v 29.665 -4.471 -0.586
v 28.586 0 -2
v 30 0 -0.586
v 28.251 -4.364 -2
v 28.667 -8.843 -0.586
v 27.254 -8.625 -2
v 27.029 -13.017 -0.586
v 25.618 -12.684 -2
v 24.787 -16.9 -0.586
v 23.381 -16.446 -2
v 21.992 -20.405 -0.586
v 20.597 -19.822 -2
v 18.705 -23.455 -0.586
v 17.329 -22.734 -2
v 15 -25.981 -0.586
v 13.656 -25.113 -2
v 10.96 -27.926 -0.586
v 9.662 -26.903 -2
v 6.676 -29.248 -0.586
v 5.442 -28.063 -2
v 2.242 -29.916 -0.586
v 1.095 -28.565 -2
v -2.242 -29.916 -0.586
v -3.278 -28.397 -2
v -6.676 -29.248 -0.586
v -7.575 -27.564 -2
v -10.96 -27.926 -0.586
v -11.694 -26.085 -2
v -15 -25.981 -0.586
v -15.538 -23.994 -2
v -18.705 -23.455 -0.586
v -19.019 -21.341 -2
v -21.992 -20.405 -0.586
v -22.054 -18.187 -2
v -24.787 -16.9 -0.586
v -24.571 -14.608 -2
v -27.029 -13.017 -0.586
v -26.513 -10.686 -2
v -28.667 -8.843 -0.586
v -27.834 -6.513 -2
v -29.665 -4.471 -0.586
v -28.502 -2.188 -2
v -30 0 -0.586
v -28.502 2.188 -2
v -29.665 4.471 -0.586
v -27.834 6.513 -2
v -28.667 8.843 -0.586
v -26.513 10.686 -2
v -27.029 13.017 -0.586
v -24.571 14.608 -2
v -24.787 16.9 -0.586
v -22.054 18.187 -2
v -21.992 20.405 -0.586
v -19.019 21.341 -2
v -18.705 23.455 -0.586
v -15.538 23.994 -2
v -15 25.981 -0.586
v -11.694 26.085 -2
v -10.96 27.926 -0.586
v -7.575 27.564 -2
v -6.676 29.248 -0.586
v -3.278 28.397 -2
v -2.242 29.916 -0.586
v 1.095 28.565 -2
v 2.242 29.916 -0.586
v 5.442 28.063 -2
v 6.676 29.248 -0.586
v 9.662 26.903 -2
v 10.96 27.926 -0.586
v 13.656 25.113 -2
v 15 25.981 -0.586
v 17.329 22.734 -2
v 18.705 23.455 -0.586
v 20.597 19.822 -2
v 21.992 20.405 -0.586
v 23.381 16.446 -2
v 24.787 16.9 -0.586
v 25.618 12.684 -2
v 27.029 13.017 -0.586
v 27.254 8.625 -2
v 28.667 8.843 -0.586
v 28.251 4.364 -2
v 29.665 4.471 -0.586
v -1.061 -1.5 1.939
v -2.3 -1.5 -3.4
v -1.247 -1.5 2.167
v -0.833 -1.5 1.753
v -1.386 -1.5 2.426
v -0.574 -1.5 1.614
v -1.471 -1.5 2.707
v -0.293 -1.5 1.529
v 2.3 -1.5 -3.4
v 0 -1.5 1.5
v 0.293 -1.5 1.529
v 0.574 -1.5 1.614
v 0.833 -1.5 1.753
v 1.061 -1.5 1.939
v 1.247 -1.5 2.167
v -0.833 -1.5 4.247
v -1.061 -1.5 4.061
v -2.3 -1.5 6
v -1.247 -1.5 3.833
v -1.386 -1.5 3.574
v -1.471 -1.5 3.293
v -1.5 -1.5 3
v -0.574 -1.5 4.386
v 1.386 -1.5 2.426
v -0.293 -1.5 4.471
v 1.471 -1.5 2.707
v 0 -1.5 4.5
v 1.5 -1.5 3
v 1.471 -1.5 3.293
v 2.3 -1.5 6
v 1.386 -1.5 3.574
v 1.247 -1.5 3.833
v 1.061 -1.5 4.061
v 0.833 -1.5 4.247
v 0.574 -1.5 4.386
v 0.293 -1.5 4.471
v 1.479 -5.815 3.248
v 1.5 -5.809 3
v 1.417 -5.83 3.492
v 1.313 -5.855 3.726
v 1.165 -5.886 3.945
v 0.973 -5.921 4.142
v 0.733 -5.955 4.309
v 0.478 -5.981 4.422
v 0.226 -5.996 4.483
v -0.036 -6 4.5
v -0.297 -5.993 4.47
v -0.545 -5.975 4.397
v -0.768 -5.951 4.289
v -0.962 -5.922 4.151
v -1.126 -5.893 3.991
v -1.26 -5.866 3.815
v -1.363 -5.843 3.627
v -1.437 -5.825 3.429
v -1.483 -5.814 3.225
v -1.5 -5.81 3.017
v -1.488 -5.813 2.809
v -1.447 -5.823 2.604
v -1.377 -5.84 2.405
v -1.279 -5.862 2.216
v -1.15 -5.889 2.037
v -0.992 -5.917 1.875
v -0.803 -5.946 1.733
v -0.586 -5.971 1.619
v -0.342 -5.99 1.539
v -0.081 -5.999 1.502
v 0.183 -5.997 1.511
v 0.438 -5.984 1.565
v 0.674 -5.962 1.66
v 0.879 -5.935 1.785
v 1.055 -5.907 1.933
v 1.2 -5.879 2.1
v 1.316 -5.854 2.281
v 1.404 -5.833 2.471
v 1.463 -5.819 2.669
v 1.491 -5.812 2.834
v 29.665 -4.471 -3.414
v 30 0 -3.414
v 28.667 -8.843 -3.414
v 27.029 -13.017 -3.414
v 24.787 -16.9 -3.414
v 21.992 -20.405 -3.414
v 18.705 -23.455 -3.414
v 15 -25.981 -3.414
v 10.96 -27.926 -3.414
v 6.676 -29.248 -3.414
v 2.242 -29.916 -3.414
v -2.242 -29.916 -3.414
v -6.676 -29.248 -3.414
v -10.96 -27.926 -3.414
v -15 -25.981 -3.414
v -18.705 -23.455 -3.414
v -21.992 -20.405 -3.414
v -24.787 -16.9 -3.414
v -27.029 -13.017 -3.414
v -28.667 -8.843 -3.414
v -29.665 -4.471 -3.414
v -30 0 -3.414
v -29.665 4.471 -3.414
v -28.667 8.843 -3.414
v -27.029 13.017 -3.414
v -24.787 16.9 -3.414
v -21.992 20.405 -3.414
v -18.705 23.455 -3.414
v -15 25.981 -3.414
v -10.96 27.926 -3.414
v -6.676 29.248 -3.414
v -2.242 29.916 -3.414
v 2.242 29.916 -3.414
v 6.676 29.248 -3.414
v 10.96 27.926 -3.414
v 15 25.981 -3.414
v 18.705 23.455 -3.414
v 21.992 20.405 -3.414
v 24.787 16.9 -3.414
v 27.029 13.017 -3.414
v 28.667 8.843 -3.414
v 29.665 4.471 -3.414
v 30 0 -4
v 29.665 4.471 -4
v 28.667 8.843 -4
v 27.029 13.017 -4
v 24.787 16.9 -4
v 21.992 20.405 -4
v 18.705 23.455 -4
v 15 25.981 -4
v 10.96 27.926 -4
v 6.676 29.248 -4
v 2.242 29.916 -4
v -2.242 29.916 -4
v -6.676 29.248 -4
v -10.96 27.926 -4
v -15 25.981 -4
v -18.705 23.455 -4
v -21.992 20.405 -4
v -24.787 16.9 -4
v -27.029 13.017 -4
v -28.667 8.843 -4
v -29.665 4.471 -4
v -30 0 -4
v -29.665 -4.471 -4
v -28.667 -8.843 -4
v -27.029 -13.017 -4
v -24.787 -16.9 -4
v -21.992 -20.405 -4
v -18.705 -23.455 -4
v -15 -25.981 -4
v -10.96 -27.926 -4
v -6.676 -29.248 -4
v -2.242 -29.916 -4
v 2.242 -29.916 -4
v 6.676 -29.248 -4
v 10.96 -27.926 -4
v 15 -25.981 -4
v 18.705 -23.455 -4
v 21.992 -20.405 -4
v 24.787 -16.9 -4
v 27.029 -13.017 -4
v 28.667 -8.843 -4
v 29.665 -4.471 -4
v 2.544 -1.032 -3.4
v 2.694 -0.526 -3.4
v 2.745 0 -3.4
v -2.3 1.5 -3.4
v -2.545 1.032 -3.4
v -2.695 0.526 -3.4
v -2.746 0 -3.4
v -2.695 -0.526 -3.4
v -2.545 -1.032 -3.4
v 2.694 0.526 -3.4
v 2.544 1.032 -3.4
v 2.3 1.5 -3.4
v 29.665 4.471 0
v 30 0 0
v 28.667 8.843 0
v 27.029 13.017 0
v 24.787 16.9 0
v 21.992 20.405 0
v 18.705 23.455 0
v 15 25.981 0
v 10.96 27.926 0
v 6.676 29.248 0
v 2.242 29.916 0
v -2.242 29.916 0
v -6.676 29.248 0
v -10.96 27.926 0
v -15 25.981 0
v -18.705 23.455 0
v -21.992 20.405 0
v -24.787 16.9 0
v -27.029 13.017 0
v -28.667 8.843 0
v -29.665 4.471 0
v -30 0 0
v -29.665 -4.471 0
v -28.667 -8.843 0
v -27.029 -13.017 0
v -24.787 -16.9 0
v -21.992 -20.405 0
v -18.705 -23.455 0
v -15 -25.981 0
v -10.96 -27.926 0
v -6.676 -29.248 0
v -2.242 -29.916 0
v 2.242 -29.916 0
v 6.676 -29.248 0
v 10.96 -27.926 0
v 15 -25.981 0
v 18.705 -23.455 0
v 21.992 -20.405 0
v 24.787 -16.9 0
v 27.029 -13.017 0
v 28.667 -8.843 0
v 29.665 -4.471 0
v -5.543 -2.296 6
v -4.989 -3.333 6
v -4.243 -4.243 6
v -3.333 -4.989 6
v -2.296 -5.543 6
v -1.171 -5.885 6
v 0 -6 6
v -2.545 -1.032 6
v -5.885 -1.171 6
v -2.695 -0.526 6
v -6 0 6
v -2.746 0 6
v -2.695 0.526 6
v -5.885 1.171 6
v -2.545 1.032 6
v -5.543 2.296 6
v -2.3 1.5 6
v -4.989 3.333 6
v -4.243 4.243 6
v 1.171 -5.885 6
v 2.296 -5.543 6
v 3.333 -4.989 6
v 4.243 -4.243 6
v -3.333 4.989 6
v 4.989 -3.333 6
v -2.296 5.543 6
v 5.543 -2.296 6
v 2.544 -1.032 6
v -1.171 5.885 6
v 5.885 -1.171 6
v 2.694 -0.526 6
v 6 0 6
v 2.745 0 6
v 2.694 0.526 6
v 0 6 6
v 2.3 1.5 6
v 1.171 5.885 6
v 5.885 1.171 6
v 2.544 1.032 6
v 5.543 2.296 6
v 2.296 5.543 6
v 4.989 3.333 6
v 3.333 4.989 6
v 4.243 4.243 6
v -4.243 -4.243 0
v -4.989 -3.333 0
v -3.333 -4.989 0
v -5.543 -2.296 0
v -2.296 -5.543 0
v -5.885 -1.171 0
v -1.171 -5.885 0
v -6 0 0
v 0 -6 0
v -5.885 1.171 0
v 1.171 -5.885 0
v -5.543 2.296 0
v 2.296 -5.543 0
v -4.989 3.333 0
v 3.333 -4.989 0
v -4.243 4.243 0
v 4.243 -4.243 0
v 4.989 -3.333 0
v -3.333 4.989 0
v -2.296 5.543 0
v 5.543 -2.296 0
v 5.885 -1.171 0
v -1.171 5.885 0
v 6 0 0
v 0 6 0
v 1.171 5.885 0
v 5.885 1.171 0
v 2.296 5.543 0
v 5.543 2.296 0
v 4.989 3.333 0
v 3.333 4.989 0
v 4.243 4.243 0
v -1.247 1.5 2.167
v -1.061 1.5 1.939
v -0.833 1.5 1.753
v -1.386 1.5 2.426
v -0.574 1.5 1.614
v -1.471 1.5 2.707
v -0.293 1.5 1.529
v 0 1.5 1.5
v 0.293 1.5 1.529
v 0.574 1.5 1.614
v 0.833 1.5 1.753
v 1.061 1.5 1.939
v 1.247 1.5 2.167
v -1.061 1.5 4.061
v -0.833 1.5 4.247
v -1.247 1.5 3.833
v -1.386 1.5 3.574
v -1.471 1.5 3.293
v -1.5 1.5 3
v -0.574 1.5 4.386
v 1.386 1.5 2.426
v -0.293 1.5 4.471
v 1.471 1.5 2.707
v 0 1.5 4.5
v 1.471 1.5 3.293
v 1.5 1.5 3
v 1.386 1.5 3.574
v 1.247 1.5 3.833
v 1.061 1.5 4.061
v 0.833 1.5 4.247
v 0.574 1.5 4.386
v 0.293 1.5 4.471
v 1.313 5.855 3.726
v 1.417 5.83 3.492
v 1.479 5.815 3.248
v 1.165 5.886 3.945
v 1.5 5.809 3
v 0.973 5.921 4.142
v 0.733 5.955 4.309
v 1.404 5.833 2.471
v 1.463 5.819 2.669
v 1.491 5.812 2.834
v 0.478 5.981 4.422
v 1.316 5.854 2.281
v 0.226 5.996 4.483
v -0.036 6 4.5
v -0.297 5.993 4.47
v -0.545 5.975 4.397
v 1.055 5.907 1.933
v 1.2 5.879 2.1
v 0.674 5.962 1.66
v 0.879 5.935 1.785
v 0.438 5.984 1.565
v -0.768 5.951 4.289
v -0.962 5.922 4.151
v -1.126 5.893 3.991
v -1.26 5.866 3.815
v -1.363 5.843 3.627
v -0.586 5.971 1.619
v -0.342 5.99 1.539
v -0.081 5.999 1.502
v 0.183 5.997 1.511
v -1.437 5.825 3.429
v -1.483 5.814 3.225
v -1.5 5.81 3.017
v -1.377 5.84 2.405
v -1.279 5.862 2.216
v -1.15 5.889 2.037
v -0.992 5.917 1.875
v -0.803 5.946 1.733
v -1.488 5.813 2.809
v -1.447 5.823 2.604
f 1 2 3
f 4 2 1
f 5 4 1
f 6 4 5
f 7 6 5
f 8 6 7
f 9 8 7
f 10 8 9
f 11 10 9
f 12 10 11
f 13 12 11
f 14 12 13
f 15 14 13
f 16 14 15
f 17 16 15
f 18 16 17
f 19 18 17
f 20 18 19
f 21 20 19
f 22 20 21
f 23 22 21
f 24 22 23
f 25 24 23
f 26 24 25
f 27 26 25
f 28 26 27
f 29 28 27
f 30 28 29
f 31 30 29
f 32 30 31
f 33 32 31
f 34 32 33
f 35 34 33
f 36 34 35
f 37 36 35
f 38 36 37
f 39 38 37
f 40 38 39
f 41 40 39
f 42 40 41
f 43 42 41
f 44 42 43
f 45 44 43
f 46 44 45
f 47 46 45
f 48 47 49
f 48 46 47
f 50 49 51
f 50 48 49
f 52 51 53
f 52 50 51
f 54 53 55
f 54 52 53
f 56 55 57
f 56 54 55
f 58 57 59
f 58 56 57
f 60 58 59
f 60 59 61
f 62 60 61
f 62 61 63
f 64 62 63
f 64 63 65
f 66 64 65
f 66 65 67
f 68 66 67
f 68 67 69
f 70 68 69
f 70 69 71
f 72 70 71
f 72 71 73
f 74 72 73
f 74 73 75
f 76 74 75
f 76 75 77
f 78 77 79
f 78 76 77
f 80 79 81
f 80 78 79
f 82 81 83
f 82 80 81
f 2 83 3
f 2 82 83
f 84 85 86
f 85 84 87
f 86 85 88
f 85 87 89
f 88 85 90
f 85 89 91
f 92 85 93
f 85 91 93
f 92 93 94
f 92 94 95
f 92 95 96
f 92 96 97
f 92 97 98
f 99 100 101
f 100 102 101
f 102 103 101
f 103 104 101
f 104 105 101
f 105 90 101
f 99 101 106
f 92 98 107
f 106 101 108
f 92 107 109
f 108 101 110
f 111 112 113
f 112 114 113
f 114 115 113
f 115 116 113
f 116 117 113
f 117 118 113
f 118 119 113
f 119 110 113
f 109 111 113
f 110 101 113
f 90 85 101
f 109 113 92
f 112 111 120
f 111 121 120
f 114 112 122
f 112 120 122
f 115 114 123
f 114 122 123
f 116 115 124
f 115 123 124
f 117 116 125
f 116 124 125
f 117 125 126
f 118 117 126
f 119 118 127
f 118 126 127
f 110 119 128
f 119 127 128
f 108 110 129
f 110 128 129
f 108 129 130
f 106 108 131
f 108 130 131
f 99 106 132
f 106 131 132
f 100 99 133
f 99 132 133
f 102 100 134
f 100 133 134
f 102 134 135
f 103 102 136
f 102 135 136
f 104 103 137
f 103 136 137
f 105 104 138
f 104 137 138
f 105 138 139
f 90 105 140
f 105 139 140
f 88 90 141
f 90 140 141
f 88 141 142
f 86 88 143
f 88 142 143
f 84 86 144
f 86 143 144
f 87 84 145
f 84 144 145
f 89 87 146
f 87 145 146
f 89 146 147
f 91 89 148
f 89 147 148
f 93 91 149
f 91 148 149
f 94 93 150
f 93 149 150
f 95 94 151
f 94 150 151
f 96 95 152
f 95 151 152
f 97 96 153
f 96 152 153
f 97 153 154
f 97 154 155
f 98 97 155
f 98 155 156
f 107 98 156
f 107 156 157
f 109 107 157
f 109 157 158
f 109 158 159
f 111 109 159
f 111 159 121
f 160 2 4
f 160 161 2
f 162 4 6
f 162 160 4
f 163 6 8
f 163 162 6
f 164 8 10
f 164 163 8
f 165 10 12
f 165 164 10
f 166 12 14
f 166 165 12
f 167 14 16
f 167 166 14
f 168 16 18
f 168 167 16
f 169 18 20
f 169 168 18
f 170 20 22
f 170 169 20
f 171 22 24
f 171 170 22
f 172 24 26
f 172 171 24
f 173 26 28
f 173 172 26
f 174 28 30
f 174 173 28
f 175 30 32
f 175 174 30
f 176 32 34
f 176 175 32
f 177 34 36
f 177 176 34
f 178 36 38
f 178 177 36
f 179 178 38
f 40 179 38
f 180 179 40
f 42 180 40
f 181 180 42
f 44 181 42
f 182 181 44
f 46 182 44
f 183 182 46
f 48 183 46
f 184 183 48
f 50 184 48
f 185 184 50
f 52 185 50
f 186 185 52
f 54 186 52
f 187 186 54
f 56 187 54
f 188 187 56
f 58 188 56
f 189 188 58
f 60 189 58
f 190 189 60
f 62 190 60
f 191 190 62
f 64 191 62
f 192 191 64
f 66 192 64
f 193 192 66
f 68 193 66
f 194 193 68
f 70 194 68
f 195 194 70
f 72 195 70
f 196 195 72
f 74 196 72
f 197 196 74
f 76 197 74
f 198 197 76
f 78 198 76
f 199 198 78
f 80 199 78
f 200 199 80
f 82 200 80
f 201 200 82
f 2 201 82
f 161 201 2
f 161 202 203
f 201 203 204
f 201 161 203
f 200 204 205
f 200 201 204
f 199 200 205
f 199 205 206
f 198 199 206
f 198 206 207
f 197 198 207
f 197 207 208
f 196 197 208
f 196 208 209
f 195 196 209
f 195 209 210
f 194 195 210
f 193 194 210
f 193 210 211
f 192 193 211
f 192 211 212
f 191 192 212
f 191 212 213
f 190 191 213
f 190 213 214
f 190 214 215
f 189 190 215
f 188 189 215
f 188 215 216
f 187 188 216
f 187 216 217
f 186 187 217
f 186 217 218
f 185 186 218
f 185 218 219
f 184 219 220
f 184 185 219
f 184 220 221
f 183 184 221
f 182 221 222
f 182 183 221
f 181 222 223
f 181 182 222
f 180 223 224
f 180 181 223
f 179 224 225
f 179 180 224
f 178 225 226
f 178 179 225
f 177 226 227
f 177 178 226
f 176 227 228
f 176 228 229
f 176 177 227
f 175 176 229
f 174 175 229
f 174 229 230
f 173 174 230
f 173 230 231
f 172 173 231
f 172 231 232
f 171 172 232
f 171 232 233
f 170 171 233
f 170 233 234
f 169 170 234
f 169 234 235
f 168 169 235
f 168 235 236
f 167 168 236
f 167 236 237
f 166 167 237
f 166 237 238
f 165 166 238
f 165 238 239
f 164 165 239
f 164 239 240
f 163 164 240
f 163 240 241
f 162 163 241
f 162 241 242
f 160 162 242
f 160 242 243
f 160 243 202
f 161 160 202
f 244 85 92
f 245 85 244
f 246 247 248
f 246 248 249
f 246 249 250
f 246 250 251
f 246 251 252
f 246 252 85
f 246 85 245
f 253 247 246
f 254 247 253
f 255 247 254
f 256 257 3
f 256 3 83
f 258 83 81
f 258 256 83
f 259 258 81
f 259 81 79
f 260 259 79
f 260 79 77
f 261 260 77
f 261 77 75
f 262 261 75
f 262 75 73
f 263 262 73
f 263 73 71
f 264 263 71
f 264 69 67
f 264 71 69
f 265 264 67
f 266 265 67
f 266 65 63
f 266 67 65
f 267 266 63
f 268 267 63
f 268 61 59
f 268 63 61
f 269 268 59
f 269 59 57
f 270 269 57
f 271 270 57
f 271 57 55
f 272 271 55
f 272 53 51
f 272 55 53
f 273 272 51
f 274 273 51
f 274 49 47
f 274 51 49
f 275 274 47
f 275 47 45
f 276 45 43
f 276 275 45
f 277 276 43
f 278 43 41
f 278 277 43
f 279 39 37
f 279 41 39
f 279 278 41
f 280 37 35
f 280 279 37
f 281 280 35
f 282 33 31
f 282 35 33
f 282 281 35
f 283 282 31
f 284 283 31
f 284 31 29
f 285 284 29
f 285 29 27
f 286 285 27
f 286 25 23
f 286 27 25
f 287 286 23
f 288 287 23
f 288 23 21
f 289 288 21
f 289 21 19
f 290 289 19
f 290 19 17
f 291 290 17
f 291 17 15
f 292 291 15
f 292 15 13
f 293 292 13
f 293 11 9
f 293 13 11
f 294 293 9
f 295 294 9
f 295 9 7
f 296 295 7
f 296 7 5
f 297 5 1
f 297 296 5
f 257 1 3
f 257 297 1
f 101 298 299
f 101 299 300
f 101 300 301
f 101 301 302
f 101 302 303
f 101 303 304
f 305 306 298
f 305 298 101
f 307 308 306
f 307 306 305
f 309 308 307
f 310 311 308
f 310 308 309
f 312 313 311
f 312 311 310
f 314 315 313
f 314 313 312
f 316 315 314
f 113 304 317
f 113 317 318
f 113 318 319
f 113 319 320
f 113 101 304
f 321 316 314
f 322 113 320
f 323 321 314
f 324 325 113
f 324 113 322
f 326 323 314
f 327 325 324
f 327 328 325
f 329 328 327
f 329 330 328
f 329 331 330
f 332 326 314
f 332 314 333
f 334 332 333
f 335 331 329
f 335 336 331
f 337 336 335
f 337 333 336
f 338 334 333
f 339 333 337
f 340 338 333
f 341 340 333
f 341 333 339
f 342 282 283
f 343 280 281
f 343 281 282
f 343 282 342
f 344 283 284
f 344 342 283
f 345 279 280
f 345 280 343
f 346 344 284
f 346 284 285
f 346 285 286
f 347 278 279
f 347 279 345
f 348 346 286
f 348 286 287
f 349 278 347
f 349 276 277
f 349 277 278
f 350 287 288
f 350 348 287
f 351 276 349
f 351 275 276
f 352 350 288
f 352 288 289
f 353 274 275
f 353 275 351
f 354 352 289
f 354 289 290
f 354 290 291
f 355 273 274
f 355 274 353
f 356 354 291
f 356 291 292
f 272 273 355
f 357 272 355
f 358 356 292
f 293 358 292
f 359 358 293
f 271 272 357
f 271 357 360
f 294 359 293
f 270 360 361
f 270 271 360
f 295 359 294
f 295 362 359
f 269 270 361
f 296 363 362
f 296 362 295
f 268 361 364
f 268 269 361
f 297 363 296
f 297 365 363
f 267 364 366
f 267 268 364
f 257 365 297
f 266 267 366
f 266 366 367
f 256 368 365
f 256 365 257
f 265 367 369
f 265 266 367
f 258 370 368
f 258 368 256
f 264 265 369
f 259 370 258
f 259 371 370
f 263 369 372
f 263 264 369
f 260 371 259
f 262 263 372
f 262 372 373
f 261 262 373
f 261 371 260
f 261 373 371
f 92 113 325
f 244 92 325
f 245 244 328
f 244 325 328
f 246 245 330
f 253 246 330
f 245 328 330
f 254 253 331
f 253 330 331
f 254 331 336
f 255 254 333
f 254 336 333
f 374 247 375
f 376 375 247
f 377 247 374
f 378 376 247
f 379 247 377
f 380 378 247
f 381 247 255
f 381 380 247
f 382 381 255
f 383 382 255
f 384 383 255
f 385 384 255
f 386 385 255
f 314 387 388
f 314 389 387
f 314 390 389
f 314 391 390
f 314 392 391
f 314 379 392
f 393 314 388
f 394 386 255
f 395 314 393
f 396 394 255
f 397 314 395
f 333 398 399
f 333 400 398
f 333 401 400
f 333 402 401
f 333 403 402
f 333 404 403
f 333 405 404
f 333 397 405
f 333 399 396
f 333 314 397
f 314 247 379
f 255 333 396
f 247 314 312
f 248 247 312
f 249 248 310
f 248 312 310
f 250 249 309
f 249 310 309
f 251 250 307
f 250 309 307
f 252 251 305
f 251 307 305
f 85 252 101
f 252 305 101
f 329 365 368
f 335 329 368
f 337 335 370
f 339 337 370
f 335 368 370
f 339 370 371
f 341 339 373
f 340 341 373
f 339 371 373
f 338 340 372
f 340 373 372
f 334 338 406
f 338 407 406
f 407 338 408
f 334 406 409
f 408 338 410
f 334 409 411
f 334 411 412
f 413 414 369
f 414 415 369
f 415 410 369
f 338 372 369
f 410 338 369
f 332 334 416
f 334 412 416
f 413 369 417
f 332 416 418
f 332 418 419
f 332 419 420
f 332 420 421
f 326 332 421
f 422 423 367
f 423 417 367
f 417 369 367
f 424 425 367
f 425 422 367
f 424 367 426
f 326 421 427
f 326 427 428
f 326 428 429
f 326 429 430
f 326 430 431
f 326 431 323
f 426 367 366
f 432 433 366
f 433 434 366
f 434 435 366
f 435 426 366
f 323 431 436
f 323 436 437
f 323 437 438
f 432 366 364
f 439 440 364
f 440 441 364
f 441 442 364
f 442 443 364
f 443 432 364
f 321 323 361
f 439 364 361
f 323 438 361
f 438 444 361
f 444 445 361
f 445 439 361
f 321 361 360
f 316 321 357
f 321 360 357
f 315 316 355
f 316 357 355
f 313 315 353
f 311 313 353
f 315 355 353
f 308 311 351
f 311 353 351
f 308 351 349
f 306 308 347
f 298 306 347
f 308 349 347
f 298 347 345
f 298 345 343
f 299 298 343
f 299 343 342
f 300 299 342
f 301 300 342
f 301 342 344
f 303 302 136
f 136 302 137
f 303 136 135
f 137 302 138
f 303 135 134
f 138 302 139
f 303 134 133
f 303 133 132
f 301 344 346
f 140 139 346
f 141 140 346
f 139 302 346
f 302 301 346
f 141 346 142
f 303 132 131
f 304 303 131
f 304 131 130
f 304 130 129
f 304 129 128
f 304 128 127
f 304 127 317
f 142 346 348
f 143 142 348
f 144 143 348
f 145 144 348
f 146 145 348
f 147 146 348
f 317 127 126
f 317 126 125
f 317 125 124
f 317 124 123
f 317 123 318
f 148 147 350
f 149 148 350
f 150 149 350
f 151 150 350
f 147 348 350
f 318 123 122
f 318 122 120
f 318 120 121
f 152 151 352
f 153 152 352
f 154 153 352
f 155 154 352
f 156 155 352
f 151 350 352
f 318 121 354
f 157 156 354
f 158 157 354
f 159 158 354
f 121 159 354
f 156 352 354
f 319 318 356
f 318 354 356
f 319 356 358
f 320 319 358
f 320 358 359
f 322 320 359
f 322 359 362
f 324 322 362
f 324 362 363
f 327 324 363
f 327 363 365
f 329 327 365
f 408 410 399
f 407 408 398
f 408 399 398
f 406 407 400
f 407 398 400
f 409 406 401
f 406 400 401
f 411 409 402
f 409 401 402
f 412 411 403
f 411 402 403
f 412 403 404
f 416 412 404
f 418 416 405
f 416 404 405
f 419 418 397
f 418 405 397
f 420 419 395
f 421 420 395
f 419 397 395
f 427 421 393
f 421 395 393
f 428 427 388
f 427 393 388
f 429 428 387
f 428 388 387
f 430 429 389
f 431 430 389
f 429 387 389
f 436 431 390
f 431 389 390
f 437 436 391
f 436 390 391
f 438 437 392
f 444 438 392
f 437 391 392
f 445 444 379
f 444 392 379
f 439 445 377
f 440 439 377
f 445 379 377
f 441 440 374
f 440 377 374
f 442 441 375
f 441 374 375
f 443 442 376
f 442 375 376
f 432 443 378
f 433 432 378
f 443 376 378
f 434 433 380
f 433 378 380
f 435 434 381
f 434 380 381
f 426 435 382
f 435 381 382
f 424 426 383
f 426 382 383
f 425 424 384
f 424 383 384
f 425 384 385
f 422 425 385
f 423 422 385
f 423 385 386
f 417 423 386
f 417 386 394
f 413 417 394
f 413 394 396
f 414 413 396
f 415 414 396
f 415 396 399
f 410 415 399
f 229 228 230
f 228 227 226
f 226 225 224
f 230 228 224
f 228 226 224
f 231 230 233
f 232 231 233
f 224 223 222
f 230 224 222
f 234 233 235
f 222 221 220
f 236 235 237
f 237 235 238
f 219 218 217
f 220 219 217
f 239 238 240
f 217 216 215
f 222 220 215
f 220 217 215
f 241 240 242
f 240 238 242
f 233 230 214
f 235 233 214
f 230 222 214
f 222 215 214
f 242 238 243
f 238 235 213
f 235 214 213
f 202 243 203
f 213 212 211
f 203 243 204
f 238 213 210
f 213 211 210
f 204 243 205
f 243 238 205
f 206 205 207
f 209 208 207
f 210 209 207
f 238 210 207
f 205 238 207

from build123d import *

# Parameters (mm, degrees)
F0_R     = 30
F0_R_2   = 6
F1_DEPTH = 4
F2_DEPTH = 6
F3_R     = 1.5
F4_DEPTH = 12.5
F5_W     = 4.6
F5_H     = 3
F6_DEPTH = 9.4


with BuildPart() as f1:
    # F0 (on Top) → F1 (new body)
    with BuildSketch(Plane.XY):
        Circle(F0_R)
        Circle(F0_R_2, mode=Mode.SUBTRACT)
        Circle(F0_R_2)
    extrude(amount=-F1_DEPTH)

    # F0 (on Top) → F2 (join)
    with BuildSketch(Plane.XY):
        Circle(F0_R_2)
    extrude(amount=F2_DEPTH)

    # F3 (on Front) → F4 (cut, symmetric)
    with BuildSketch(Plane.XZ):
        with Locations((0, 3)):
            Circle(F3_R)
    extrude(amount=F4_DEPTH, both=True, mode=Mode.SUBTRACT)

    # F5 (on face) → F6 (cut)
    with BuildSketch(Plane.XY.offset(6)):
        Rectangle(F5_W, F5_H)
        with BuildLine():
            ThreePointArc((-2.3, 1.5), (-2.7459060435, 0), (-2.3, -1.5))
            Line((-2.3, -1.5), (-2.3, 1.5))
        make_face()
        with BuildLine():
            Line((2.3, 1.5), (2.3, -1.5))
            ThreePointArc((2.3, -1.5), (2.745183651, 0), (2.3, 1.5))
        make_face()
    extrude(amount=-F6_DEPTH, mode=Mode.SUBTRACT)

    # F7 (on Front) → F8 (revolve, cut)
    with BuildSketch(Plane.XZ):
        Polygon((30, -3.4142135624), (30, -0.5857864376), (28.5857864376, -2), align=None)
    revolve(axis=Axis((0, 0, 0.7614716887), (0, 0, -1)), mode=Mode.SUBTRACT)


solid = f1.part
